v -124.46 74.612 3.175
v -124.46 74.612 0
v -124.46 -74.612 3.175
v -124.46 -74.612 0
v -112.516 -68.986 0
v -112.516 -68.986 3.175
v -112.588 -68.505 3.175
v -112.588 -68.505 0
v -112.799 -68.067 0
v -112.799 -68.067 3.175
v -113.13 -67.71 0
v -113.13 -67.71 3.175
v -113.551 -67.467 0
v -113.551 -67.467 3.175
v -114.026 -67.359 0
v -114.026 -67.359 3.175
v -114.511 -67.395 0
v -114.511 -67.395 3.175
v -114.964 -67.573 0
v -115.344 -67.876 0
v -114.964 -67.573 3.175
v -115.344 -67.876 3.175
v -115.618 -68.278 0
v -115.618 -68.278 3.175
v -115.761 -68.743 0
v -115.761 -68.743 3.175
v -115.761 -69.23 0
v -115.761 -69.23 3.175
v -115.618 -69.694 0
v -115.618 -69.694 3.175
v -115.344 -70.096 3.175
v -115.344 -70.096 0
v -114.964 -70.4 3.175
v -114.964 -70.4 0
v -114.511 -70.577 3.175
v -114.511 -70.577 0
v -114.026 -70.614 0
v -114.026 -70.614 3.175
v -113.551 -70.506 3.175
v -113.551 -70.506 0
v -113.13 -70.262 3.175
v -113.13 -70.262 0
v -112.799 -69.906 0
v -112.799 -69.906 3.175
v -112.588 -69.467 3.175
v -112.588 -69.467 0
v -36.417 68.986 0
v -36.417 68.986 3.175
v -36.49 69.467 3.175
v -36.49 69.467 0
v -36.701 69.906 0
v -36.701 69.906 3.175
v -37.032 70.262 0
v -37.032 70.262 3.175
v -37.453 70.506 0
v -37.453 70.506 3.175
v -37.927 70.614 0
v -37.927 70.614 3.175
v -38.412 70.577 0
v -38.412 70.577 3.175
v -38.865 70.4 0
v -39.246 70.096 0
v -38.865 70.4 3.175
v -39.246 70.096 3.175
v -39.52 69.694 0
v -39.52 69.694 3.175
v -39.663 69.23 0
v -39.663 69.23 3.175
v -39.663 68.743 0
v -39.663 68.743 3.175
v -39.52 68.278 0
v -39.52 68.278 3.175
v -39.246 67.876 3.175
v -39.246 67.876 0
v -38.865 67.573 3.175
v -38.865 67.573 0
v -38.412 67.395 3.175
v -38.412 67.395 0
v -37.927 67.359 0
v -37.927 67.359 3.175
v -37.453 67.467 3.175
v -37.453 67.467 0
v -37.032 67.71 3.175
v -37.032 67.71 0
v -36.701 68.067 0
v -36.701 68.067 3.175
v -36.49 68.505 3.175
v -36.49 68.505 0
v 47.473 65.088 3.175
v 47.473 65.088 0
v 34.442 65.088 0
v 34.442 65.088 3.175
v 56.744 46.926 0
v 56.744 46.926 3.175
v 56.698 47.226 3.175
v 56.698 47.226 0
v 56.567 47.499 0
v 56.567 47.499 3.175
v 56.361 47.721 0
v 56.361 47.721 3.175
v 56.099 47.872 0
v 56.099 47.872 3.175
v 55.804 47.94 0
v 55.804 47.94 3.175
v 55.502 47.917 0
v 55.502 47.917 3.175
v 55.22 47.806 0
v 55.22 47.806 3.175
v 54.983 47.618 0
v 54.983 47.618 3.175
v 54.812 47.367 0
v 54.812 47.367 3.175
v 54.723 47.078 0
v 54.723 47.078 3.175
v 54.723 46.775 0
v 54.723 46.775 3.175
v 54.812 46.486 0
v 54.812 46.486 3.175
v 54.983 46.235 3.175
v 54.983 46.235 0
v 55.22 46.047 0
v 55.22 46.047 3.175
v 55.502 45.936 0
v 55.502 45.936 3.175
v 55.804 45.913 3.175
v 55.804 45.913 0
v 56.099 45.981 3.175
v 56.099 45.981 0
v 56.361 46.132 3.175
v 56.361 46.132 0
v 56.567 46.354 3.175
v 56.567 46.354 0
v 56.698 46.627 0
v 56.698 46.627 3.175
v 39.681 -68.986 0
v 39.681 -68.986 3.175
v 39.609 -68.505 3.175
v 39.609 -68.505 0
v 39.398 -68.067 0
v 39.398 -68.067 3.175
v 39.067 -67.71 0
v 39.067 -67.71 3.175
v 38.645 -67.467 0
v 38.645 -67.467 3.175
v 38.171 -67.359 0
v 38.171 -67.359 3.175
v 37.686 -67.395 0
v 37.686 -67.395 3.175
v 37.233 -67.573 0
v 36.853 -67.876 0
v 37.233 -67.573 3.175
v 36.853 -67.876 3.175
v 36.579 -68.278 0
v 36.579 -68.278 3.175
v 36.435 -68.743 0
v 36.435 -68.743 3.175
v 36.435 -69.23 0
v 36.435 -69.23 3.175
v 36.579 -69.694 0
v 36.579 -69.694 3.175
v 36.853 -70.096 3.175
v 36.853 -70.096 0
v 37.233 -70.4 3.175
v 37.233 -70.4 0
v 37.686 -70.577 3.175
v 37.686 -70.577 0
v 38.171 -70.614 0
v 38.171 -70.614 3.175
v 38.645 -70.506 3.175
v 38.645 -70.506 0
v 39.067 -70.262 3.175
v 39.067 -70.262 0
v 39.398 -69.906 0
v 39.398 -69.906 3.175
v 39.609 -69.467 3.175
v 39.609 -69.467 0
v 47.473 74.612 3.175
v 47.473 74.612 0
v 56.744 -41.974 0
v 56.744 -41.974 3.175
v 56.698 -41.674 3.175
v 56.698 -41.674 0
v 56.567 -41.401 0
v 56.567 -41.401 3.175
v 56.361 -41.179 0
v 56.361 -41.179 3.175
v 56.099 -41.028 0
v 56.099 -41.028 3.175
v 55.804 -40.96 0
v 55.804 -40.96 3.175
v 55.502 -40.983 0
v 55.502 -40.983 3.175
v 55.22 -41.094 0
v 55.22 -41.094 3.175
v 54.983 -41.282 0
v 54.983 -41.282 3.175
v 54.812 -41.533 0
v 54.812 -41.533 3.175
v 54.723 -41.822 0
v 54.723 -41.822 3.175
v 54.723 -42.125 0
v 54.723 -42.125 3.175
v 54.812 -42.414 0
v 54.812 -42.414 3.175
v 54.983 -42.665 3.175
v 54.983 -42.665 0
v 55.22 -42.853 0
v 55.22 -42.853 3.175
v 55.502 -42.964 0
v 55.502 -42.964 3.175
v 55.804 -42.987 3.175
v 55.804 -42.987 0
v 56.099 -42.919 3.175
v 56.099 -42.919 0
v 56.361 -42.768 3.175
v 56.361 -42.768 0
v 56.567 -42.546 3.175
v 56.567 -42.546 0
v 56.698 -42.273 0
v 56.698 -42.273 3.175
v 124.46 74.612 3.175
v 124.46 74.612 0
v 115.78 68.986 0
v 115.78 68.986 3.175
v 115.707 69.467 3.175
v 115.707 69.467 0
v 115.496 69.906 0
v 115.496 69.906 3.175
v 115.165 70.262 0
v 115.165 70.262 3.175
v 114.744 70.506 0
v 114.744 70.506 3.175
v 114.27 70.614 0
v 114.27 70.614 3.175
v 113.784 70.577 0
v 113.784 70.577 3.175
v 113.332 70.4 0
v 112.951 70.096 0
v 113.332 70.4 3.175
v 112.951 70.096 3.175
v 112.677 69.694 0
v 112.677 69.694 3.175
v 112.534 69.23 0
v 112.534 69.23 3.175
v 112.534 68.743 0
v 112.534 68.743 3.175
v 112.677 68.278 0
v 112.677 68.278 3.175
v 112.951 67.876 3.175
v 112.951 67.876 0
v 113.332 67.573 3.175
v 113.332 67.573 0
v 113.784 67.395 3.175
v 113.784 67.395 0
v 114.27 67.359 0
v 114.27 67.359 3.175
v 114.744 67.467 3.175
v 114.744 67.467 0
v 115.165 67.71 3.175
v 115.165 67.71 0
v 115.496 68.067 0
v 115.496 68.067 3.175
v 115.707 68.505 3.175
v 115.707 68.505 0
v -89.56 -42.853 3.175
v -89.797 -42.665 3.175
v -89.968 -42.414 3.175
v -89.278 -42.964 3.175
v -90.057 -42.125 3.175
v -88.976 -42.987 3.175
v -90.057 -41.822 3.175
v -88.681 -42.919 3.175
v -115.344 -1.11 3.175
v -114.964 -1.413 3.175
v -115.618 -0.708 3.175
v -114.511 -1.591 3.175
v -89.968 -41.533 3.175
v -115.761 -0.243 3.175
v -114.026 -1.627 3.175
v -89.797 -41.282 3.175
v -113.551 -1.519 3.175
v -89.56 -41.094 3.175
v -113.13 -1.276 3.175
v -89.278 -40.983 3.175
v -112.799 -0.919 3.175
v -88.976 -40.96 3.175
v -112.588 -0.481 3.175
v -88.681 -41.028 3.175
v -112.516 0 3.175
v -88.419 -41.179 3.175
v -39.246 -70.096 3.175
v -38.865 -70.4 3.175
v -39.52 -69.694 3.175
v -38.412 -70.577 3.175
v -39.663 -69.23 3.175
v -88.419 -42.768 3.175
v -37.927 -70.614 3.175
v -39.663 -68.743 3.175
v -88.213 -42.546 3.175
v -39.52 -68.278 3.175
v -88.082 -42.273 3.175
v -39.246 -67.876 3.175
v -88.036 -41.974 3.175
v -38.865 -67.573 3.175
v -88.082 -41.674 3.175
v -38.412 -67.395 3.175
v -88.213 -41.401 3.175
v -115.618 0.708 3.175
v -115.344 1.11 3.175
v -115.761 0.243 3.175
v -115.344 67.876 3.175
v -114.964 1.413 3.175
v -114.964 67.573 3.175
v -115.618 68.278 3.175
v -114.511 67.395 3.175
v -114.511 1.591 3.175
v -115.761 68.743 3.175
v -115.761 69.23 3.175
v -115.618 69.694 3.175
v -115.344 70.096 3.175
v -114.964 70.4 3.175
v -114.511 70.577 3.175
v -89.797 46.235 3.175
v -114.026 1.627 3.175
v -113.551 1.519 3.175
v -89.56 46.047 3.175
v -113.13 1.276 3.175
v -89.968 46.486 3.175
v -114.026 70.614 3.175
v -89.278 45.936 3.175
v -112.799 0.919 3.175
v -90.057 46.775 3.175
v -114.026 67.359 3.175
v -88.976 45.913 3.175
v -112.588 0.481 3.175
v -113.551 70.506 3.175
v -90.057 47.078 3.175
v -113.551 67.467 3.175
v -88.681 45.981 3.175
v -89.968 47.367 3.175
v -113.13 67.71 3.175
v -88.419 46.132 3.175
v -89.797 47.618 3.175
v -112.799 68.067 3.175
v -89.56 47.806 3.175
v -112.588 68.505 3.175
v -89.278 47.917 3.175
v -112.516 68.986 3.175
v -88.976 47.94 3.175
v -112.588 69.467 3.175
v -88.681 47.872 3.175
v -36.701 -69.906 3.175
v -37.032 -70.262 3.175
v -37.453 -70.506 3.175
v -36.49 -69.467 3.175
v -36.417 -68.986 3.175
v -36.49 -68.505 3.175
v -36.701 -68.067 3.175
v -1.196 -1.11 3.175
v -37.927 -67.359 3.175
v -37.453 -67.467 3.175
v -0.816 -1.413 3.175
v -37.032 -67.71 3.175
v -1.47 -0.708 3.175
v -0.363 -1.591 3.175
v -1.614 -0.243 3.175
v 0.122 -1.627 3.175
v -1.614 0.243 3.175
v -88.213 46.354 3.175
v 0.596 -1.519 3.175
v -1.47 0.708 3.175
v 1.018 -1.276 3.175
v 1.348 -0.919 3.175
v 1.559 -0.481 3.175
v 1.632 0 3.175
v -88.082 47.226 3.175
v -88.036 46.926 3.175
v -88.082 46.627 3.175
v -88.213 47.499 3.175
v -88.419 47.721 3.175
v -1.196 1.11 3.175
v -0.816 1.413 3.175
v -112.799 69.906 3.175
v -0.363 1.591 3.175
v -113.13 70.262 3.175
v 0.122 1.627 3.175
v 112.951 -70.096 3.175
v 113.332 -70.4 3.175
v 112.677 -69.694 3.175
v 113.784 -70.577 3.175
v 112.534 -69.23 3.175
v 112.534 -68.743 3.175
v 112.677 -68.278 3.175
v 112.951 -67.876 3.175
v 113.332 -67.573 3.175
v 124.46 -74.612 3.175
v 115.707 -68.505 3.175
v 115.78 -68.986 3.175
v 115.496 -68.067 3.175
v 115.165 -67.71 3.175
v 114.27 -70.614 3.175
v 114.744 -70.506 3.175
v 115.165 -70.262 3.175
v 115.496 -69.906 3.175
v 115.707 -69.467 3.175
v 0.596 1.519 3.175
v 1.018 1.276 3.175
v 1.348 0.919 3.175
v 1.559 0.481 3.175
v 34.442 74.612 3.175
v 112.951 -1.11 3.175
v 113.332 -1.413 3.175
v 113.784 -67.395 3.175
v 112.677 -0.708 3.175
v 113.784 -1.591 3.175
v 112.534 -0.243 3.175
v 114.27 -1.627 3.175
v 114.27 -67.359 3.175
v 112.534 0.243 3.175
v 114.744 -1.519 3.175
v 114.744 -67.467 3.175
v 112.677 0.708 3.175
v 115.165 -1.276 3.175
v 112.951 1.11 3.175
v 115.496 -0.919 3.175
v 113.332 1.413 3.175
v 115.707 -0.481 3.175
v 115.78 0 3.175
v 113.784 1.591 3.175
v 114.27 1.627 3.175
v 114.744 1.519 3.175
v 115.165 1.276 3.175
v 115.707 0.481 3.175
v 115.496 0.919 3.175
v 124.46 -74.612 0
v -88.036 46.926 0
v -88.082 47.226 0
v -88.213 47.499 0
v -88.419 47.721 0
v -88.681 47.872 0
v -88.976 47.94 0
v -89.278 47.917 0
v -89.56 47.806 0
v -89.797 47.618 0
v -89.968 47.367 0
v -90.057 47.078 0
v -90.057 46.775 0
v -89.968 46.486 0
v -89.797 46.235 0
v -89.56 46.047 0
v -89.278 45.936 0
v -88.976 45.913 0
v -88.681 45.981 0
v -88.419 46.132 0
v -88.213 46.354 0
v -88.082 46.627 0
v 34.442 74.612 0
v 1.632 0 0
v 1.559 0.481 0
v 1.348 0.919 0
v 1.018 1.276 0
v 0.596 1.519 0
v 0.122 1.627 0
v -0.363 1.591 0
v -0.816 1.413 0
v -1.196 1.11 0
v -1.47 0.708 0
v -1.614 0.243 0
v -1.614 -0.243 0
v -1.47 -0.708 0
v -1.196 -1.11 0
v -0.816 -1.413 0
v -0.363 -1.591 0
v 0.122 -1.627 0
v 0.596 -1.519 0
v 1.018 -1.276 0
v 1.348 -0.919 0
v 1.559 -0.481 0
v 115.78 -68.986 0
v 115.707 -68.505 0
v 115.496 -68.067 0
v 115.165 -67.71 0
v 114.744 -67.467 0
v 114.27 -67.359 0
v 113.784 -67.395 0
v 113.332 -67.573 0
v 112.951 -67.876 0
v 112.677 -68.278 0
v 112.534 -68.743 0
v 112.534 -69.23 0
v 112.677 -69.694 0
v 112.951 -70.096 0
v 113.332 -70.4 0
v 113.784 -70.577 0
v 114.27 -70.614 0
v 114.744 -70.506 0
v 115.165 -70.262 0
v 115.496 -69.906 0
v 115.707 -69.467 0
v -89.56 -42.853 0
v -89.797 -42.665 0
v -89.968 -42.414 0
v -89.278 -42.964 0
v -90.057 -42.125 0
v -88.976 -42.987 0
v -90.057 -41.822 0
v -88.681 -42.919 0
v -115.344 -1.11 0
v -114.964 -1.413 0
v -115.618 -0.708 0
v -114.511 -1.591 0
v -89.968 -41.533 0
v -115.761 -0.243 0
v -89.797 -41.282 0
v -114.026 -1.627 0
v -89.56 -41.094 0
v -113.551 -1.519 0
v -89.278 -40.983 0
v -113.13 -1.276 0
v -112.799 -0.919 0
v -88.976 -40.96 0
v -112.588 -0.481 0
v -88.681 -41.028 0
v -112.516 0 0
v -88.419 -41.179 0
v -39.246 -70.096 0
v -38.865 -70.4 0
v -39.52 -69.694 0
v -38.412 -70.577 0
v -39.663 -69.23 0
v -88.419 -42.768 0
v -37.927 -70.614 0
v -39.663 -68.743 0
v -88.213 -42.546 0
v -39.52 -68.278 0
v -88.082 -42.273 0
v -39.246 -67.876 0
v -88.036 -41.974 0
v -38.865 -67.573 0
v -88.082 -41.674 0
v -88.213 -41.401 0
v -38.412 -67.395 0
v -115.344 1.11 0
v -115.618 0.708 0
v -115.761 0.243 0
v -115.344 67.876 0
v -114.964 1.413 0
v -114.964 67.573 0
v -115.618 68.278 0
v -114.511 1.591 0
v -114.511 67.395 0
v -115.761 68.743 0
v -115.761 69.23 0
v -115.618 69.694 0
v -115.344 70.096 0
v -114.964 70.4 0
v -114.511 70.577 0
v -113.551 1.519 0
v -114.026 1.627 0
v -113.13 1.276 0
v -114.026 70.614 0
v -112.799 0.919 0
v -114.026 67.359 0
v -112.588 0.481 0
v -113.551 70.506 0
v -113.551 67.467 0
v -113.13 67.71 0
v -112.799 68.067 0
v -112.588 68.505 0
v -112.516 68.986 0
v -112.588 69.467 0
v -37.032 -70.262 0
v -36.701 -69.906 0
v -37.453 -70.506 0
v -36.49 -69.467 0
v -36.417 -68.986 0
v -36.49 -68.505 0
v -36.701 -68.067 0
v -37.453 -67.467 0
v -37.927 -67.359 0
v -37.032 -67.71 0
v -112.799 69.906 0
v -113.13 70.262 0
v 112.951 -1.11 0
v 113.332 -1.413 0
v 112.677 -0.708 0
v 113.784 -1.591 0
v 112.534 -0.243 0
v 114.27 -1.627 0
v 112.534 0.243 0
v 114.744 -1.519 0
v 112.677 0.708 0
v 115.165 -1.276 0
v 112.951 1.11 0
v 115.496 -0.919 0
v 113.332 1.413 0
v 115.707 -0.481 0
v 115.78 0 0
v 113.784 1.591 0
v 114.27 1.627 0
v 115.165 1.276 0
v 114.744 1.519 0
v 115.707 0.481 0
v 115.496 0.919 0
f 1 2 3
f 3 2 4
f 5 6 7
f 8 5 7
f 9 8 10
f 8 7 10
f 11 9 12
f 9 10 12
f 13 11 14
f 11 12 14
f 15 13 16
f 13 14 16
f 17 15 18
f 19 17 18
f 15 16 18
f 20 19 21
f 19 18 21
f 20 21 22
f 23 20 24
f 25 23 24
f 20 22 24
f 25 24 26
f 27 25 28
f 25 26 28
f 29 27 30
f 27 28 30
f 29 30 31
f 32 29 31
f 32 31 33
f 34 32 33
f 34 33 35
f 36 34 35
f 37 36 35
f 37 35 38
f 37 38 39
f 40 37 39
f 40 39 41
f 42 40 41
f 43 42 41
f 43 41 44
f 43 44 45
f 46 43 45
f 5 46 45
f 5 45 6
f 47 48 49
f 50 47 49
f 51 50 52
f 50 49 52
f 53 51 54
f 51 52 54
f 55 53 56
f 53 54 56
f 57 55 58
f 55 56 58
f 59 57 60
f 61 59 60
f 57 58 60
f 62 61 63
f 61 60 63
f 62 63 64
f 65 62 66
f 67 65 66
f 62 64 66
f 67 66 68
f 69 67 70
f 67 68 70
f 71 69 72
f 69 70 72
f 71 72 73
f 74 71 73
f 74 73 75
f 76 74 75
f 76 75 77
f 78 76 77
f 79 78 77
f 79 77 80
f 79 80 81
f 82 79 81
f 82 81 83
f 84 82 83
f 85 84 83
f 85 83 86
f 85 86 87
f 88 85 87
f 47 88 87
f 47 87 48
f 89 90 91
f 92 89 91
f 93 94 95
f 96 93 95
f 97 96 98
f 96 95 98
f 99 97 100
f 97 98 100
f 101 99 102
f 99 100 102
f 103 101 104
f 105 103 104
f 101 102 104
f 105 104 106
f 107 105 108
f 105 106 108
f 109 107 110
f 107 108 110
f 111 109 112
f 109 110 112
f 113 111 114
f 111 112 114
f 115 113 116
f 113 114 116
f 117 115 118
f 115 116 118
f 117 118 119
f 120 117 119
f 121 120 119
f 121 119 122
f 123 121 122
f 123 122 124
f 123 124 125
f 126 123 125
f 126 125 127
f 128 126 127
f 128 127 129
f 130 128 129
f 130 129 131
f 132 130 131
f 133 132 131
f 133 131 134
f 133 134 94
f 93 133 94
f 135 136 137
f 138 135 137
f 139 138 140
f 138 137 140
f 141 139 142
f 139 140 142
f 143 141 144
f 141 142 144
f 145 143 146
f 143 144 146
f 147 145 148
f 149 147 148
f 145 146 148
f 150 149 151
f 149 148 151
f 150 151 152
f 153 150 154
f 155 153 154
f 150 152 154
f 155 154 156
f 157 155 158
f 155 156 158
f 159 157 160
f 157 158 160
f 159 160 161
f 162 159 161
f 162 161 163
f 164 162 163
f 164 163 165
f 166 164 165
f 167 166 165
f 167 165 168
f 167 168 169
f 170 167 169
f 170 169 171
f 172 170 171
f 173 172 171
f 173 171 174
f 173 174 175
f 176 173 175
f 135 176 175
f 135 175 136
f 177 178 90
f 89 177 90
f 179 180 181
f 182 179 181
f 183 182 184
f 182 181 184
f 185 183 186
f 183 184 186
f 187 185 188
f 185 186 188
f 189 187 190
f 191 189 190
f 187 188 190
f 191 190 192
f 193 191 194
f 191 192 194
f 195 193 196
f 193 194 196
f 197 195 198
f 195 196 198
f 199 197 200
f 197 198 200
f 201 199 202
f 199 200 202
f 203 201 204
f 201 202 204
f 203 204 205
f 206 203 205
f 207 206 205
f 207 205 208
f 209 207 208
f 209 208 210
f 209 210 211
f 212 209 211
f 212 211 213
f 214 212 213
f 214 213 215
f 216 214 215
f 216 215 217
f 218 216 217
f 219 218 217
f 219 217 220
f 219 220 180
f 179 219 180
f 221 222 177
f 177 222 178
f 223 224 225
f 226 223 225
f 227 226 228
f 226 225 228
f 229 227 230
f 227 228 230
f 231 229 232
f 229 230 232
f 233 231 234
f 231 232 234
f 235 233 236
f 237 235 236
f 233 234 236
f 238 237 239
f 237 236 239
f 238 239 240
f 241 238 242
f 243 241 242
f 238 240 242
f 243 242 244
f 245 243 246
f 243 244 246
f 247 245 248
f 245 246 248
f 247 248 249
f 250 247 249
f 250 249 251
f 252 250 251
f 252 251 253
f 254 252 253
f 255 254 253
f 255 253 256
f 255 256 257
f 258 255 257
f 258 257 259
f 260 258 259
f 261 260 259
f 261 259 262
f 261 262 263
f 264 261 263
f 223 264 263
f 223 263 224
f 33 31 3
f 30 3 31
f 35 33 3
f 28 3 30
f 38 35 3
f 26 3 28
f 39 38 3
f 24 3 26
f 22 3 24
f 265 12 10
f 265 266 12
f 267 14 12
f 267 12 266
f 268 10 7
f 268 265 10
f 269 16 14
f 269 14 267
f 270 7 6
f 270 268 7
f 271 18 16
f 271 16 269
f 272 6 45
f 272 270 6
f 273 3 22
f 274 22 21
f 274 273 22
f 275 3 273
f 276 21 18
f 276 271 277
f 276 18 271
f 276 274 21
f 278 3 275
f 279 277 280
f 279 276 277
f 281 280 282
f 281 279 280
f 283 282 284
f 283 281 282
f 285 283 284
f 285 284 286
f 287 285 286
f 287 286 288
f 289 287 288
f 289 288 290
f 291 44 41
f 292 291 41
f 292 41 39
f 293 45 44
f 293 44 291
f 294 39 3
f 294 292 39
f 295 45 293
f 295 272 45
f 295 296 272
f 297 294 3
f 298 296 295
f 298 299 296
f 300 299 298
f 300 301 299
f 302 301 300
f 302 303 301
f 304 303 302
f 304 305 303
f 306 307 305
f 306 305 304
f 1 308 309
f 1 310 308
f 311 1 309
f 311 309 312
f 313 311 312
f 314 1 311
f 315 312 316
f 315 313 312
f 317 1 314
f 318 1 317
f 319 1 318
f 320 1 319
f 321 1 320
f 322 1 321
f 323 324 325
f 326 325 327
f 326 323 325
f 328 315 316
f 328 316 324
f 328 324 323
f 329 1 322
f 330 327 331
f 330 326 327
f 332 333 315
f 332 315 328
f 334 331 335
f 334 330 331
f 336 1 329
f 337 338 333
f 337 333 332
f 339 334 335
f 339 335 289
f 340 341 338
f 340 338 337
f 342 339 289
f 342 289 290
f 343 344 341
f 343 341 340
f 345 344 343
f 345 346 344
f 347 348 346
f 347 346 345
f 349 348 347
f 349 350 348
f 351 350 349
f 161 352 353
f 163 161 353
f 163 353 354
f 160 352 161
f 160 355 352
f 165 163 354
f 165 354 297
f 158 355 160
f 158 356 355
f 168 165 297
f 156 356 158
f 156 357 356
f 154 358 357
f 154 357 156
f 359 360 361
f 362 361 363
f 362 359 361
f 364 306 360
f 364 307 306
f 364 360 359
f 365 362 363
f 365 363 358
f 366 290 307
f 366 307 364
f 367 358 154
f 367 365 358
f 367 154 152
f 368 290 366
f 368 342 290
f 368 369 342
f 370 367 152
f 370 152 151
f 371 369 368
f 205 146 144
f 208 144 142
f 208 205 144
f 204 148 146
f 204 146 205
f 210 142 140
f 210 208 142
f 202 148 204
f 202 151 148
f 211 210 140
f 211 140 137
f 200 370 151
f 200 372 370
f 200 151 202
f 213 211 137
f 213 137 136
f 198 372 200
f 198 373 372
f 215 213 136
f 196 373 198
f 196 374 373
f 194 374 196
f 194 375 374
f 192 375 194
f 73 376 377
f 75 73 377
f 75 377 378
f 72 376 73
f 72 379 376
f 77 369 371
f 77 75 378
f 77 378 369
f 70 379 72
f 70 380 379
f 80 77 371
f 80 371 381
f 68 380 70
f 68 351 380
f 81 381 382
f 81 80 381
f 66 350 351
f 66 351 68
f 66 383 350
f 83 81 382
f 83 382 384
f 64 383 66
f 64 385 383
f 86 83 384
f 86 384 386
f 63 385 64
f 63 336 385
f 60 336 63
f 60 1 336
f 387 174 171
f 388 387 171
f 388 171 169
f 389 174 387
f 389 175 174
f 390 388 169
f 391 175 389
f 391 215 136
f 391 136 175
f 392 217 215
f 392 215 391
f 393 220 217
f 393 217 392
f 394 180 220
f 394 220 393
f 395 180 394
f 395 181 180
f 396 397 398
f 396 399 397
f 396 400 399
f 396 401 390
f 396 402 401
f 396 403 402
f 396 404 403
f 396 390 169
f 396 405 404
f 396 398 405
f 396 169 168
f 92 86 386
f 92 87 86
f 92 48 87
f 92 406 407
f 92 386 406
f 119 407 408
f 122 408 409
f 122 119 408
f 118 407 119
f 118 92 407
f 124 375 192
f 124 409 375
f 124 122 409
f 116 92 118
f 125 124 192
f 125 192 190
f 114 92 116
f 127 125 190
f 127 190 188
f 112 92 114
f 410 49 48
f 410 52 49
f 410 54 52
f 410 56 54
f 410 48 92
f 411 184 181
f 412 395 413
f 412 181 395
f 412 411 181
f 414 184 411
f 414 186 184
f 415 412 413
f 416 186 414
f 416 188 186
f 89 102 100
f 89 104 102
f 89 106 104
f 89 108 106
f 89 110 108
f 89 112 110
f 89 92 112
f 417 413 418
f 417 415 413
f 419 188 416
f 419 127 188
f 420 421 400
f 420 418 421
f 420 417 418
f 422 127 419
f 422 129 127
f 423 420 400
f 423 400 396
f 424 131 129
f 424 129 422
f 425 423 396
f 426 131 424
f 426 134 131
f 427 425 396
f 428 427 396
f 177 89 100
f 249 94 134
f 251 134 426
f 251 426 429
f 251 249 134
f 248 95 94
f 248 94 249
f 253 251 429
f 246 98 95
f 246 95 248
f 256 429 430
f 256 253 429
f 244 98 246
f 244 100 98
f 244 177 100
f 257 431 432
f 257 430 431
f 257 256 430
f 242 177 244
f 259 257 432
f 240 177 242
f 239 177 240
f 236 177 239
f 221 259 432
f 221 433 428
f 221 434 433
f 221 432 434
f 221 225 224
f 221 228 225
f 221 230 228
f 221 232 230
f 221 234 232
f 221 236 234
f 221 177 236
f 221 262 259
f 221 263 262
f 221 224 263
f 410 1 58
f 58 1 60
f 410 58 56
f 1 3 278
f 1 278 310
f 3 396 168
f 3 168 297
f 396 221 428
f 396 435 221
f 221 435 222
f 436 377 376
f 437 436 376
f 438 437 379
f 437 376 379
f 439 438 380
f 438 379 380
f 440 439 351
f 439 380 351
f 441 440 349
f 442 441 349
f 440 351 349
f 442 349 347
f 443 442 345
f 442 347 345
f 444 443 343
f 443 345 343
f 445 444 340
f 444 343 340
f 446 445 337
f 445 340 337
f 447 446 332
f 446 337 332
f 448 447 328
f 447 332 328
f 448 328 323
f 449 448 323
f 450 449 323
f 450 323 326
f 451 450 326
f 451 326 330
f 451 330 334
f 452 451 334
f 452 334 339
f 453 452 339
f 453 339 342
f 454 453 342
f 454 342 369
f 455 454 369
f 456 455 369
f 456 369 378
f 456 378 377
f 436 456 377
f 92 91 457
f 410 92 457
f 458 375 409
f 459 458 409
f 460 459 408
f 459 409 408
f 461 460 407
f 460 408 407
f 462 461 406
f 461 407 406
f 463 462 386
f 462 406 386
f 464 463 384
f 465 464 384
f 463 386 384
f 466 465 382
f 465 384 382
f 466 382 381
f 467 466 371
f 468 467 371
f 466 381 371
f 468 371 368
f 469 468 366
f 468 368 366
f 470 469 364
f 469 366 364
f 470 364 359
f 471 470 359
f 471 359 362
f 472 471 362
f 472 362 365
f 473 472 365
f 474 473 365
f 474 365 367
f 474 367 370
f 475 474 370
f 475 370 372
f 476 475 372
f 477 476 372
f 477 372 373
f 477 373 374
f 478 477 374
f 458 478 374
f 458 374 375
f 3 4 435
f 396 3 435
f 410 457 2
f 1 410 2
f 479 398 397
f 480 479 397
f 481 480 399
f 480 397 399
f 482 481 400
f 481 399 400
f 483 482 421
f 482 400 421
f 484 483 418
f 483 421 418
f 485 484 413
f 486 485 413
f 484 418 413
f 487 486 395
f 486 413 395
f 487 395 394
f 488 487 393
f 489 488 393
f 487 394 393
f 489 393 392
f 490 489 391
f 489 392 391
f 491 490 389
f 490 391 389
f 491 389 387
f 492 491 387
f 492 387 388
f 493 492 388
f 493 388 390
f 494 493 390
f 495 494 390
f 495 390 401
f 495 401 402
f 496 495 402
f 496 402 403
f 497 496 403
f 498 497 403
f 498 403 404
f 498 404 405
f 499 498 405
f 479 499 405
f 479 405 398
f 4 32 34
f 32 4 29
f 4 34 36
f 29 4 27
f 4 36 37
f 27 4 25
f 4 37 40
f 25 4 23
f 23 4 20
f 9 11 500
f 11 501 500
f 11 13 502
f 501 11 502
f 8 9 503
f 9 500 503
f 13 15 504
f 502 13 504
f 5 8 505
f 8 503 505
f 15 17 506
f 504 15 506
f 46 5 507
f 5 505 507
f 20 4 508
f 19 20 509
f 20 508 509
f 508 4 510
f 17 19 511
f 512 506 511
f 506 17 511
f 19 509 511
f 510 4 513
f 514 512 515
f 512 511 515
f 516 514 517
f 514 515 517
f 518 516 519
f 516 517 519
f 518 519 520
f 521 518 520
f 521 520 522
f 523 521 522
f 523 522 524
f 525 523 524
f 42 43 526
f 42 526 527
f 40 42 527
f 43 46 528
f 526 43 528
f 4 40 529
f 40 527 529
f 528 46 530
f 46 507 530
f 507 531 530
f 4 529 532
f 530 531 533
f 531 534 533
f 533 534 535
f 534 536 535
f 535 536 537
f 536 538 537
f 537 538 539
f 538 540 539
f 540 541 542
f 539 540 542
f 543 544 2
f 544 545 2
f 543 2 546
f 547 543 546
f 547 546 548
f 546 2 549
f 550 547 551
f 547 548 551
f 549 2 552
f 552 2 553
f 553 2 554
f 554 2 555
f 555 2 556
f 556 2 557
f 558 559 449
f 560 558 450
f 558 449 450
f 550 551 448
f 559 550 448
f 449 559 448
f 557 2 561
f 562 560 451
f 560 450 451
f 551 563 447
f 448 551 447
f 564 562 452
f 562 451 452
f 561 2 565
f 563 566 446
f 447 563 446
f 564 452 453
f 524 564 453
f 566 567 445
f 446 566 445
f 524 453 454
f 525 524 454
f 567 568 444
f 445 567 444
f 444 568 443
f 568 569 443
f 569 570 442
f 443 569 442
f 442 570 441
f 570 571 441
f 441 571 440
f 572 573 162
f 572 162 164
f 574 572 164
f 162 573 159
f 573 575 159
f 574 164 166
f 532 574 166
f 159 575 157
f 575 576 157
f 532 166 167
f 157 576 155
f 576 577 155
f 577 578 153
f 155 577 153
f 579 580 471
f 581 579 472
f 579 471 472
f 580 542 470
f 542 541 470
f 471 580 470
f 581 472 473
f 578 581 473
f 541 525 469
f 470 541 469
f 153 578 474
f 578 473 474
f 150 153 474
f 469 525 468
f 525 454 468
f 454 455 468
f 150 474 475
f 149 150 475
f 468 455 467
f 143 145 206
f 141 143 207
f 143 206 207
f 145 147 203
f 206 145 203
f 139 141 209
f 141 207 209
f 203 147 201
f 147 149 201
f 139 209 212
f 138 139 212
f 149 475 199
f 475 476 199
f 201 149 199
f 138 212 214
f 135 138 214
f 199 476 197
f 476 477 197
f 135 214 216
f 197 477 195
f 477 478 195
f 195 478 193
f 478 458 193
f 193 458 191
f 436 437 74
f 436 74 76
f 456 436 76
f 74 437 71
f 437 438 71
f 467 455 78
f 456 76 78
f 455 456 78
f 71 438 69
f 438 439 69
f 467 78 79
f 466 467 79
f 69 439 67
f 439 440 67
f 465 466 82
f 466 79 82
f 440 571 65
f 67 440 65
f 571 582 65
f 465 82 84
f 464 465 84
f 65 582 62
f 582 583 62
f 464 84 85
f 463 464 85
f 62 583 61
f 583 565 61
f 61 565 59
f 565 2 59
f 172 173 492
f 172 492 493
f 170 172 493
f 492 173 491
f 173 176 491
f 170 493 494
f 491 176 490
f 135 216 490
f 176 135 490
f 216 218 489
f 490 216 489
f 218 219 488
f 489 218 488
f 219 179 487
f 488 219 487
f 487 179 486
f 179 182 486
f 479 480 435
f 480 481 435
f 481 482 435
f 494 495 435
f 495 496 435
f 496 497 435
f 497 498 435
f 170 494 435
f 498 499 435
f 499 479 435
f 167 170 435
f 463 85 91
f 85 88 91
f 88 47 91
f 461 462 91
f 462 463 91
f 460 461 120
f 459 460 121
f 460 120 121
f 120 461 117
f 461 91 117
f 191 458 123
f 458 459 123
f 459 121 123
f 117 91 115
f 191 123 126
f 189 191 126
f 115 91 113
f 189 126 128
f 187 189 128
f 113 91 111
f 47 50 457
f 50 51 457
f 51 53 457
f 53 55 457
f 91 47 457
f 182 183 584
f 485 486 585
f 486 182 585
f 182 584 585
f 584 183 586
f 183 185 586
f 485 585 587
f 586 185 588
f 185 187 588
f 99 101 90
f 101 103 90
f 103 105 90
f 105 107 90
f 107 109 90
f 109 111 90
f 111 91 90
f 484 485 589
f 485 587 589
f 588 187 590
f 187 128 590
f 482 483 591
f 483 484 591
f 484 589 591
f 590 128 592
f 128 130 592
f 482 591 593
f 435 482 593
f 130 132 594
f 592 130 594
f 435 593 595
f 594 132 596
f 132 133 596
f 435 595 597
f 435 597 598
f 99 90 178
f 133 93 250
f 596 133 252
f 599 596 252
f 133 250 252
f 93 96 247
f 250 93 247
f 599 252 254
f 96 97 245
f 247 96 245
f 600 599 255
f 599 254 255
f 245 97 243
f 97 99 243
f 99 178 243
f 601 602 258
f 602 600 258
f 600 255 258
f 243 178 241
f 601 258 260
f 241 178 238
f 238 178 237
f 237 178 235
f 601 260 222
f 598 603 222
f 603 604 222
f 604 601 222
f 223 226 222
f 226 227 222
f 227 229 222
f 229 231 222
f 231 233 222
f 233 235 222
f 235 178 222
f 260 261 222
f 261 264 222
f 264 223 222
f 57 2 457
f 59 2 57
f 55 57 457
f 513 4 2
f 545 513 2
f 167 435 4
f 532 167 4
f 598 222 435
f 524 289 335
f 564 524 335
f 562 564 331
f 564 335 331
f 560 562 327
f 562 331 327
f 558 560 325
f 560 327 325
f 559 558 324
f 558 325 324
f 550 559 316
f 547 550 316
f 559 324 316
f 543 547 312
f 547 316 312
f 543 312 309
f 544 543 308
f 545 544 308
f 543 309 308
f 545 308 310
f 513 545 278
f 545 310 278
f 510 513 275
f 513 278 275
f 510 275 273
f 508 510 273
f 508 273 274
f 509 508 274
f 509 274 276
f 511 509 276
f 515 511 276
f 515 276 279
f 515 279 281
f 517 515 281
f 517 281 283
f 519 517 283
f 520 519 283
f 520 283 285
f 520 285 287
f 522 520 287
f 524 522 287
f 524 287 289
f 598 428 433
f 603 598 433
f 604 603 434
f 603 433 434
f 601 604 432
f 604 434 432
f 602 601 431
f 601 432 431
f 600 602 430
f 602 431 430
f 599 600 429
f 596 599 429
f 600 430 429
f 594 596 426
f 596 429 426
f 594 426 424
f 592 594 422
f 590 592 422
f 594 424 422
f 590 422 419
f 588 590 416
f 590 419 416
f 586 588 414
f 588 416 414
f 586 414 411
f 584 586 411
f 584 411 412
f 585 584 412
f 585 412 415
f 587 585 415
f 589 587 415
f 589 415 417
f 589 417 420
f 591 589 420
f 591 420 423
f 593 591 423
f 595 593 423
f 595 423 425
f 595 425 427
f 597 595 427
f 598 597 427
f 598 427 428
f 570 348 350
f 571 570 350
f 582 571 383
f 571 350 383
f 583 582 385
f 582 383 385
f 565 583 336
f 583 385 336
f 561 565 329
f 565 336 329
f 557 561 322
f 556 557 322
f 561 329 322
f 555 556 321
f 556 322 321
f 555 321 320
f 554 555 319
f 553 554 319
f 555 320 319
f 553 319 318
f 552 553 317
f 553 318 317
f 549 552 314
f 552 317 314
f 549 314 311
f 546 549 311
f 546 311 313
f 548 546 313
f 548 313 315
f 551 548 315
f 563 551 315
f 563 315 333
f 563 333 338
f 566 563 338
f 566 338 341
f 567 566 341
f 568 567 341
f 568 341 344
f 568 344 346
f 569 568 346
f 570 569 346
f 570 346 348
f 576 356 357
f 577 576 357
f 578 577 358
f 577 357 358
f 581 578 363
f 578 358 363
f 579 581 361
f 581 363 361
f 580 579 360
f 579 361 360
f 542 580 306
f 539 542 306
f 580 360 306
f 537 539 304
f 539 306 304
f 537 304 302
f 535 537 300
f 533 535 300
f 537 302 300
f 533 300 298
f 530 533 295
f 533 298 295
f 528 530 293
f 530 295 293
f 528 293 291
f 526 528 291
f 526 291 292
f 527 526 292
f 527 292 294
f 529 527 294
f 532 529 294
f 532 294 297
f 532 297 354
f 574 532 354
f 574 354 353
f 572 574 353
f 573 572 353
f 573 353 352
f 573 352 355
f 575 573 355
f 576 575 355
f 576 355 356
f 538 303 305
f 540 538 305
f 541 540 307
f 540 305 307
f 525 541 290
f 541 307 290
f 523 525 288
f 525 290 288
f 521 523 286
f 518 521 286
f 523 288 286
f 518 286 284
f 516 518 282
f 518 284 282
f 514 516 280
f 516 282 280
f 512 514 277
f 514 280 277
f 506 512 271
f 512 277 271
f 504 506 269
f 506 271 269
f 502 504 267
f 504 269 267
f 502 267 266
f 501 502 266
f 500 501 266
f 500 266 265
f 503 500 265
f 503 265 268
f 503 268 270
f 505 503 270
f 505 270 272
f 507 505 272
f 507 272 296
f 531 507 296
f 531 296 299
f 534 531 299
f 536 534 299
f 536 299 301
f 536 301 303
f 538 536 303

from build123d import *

# Parameters (mm, degrees)
BOSS_EXTRUDE1_DEPTH       = 3.175
F_4_CLEARANCE_HOLE1_D     = 3.2639
F_4_CLEARANCE_HOLE1_DEPTH = 56.388
F_4_CLEARANCE_HOLE1_TIP   = 0.980574487
F_4_40_TAPPED_HOLE1_D     = 2.032
F_4_40_TAPPED_HOLE1_DEPTH = 7.62
F_4_40_TAPPED_HOLE1_TIP   = 0.610474389


with BuildPart() as part:
    # Sketch1 → Boss-Extrude1 (new body)
    with BuildSketch(Plane.XY):
        Polygon((34.4424, 65.0875), (34.4424, 74.6125), (-124.46, 74.6125), (-124.46, -74.6125), (124.46, -74.6125), (124.46, 74.6125), (47.4726, 74.6125), (47.4726, 65.0875), align=None)
    extrude(amount=BOSS_EXTRUDE1_DEPTH)

    # #4 Clearance Hole1
    with Locations(Plane(origin=(0, 0, 0), x_dir=(-1, 0, 0), z_dir=(0, 0, -1))):
        with Locations((114.1476, -68.9864), (-114.1476, -68.9864), (-114.1476, 68.9864), (114.1476, 68.9864), (114.1476, 0), (-114.1476, 0), (38.0492, 68.9864), (-38.0492, 68.9864), (-38.0492, -68.9864), (38.0492, -68.9864), (0, 0)):
            Hole(F_4_CLEARANCE_HOLE1_D / 2, depth=F_4_CLEARANCE_HOLE1_DEPTH)
            with Locations((0, 0, -(F_4_CLEARANCE_HOLE1_DEPTH + F_4_CLEARANCE_HOLE1_TIP / 2))):  # 118° drill point
                Cone(0, F_4_CLEARANCE_HOLE1_D / 2, F_4_CLEARANCE_HOLE1_TIP, mode=Mode.SUBTRACT)

    # #4-40 Tapped Hole1
    with Locations(Plane(origin=(0, 0, 0), x_dir=(-1, 0, 0), z_dir=(0, 0, -1))):
        with Locations((-55.7276, -41.9735), (-55.7276, 46.9265), (89.0524, 46.9265), (89.0524, -41.9735)):
            Hole(F_4_40_TAPPED_HOLE1_D / 2, depth=F_4_40_TAPPED_HOLE1_DEPTH)
            with Locations((0, 0, -(F_4_40_TAPPED_HOLE1_DEPTH + F_4_40_TAPPED_HOLE1_TIP / 2))):  # 118° drill point
                Cone(0, F_4_40_TAPPED_HOLE1_D / 2, F_4_40_TAPPED_HOLE1_TIP, mode=Mode.SUBTRACT)


solid = part.part
